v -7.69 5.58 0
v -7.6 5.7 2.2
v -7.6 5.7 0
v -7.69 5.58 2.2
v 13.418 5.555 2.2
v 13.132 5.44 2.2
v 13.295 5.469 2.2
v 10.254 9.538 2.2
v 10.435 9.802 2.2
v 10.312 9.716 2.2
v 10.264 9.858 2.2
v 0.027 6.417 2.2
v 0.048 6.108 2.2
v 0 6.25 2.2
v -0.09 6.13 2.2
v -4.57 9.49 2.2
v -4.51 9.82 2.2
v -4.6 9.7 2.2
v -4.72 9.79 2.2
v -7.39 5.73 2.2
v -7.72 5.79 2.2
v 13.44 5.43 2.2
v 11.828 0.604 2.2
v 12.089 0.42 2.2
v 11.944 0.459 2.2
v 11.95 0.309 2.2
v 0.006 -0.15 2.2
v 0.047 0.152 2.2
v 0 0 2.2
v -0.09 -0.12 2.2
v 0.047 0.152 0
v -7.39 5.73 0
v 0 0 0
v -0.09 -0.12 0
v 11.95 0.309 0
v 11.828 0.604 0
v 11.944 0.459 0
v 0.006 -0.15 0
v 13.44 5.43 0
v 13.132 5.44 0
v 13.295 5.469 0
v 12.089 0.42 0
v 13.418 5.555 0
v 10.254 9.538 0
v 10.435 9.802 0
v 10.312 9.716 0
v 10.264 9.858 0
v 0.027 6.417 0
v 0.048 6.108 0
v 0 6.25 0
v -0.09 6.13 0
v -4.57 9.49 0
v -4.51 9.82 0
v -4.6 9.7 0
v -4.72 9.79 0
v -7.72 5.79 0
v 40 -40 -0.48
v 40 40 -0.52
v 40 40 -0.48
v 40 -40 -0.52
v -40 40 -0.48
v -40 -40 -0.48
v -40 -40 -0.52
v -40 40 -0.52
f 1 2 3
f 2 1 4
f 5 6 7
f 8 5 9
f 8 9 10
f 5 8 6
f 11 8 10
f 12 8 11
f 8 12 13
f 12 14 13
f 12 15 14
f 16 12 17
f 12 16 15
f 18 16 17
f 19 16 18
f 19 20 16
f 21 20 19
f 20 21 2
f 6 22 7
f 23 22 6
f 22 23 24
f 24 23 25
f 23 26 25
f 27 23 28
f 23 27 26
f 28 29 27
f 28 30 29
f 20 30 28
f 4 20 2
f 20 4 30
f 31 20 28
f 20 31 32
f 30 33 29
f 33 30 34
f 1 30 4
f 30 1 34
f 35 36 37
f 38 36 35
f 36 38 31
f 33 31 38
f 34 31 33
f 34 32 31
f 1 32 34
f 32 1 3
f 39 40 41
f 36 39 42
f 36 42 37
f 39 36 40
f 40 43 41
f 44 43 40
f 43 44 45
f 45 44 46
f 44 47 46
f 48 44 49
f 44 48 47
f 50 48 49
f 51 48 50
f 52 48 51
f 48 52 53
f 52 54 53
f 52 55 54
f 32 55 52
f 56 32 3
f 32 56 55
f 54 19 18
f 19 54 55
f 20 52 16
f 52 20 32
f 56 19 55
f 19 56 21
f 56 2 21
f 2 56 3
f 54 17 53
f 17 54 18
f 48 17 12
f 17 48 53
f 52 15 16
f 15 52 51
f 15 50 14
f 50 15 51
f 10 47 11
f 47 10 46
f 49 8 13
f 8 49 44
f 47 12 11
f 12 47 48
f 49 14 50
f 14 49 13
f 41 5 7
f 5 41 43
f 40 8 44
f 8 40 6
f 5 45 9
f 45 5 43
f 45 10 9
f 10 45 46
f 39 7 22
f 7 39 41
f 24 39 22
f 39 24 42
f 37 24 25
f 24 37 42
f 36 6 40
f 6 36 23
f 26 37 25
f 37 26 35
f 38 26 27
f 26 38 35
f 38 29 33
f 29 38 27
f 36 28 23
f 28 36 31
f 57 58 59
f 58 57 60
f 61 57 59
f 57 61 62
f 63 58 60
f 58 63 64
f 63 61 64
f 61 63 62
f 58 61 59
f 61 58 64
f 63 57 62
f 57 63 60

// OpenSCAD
// file: lib/measurement.scad
// Written in 2015 by Marius Kintel <marius@kintel.net>
// Additions 2020 by Mokshasoft AB
//
// To the extent possible under law, the author(s) have dedicated all
// copyright and related and neighboring rights to this software to the
// public domain worldwide. This software is distributed without any
// warranty.
//
// You should have received a copy of the CC0 Public Domain
// Dedication along with this software.
// If not, see <http://creativecommons.org/publicdomain/zero/1.0/>.

// Area of a triangle with the 3rd vertex in the origin
function triarea(v0, v1) = cross(v0, v1) / 2;

// Area of a polygon using the Shoelace formula
function area(vertices) =
  let (areas = [let (num=len(vertices))
                  for (i=[0:num-1]) 
                    triarea(vertices[i], vertices[(i+1)%num])
               ])
      sum(areas);

// Recursive helper function: Sums all values in a list.
// In this case, sum all partial areas into the final area.
function sum(values,s=0) =
  s == len(values) - 1 ? values[s] : values[s] + sum(values,s+1);

function length(p1, p2) =
    sqrt(pow(p1[0] - p2[0], 2) + pow(p1[1] - p2[1], 2));

function vlength(p) =
  let (num  = len(p),
       lens = [ for (i=[0:num-2]) length(p[i], p[i + 1]) ])
    sum(lens);

function angle(p1, pc, p2) =
  let ( v1 = p1 - pc
      , v2 = p2 - pc
      , n1 = v1/norm(v1)
      , n2 = v2/norm(v2)
      )
    acos(n1*n2);
// file: lib/element.scad
// constants
gr = 1.61803; // golden ration

// calculate the coordinates for the corners
function point(i, r, corners) =
   let (vz = 360/corners/2)
   let (angle=i*(360/corners) - vz)
   [ r*cos(angle)
   , r*sin(angle)
   ];

function inbetween(p1, p2, procent) =
    let (x_diff = p2[0] - p1[0])
    let (y_diff = p2[1] - p1[1])
    [ p1[0] + x_diff*procent/100
    , p1[1] + y_diff*procent/100
    ];

module glas_color() {
    color("lightblue")
    children();
}

// create a wall
module wall(p1, p2, h, thickness = 300) {
    let (x_diff = p2[0] - p1[0])
    let (y_diff = p2[1] - p1[1])
    let (len = sqrt(pow(x_diff, 2) +
                    pow(y_diff, 2)))
    linear_extrude(height = h)
    translate(p1)
    rotate(atan2(y_diff, x_diff))
    translate([0, -thickness/2])
    square([len, thickness]);
}

module octagon(r, h, corners) {
    coords=[for (i = [0:corners-1]) point(i, r, corners)];
    linear_extrude(height = h)
    polygon(coords);
}

module octawalls(r, h, wt, corners) {
    difference () {
        octagon(r, h, corners);
        translate([0, 0, -wt])
        octagon(r - wt, h + 2*wt, corners);
    }
}

module window(p1, p2, pos, height, sizex, sizey, wt = 300) {
    assert(0 < pos && pos < 100);
    x_diff = p2[0] - p1[0];
    y_diff = p2[1] - p1[1];
    len = sqrt(pow(x_diff, 2) +
               pow(y_diff, 2));
    difference () {
        children();
        // create the hole for the window
        translate([0,0,height])
        translate(p1 + pos*[x_diff, y_diff]/100)
        rotate(atan2(y_diff, x_diff) + 90, [0,0,1])
        cube([4*wt, sizex, sizey], center = true);
    }
    // add the glass to the window
    glas_color()
    translate([0,0,height])
    translate(p1 + pos*[x_diff, y_diff]/100)
    rotate(atan2(y_diff, x_diff) + 90, [0,0,1])
    translate([wt/2, 0, 0])
    cube([wt/2, sizex, sizey], center = true);
}

module color_lawn() {
    color("LawnGreen")
    children();
}

module color_outer_wall() {
    color("MediumSpringGreen")
    children();
}

module color_inner_wall() {
    color("Ivory")
    children();
}

module color_roof() {
    color("Lavender")
    children();
}

module color_floor() {
    color("Wheat")
    children();
}

module color_logs() {
    color("Ivory")
    children();
}

module color_glass() {
    color("azure", 0.25)
    children();
}
// main file
include <lib/element.scad>
include <lib/measurement.scad>

// configure the rendering
show_floor = true;
show_roof = true;
show_lawn = true;

// Parameters
s = 20;
a1 = atan(3/4);
ll = 9.5;
wl = 5;
a2 = 10;
l2 = 11.3;
l3 = 13.5;
l4 = 4.7;

room_h = 2.2;  // room height
oh = 0.6;       // over-hang of the roof
log_d = 0.4;    // log diameter

module win(p1, p2, pos, height, sizex, sizey, wt = 0.3) {
    window(p1, p2, pos, height, sizex, sizey, wt)
    children();
}

module w(p1, p2, h, thickness = 0.300) {
    wall(p1, p2, h, thickness)
    children();
}

// Corners of the outer walls of house
p1 = [0, 0];
p2 = p1 + [-ll*cos(a1), ll*sin(a1)];
p3 = p2 + [-wl*cos(a1 + 90), wl*sin(a1 + 90)];
p4 = [0, wl/cos(a1)];
pc = (p1 + p4)/2;
p6 = pc + [l3*cos(a2), l3*sin(a2)];
p5 = pc + [l2*cos(a2), l2*sin(a2)] + [-l4*cos(a2 - 90), -l4*sin(a2 - 90)];
p7 = pc + [l2*cos(a2), l2*sin(a2)] + [l4*cos(a2 - 90), l4*sin(a2 - 90)];

// Corners of the bed-room

// Lawn
if (show_lawn) {
    color_lawn()
    translate([0, 0, -0.5])
    cube([4*s, 4*s, 0.04], center = true);
}

module hus() {
    // Windows

    color_outer_wall()
    union() {
        // Outer walls
        w(p1, p2, room_h);
        w(p2, p3, room_h);
        w(p3, p4, room_h);
        w(p4, p5, room_h);
        w(p5, p6, room_h);
        w(p6, p7, room_h);
        w(p7, p1, room_h);
    }

    if (show_floor) {
        //color_floor()
        //linear_extrude(300)
        //polygon([p1, p2, p3, p4, p5]);
    }

    if (show_roof) {
    }

}

hus();

// Areas
house_area = -area([p1, p2, p3, p4, p5, p6, p7, p1]);
echo("house area = ", house_area, " m2");

// Lengths
l57 = length(p5, p7);
echo("longest roof length = ", l57);

// Material calculations
th_walls = 0.4;
th_floor = 0.3;
th_roof = 0.5;

wall_length = vlength([p1, p2, p3, p4, p5, p6, p7, p1]);
wall_area = wall_length * room_h;
wall_volume = wall_area * th_walls;
echo("wall length = ", wall_length, " m");
echo("wall area = ", wall_area, " m2");
echo("wall volume = ", wall_volume, " m3");

roof_volume = house_area*th_roof;
floor_volume = house_area*th_floor;
echo("roof volume = ", roof_volume);
echo("floor volume = ", floor_volume);

total_volume = wall_volume + roof_volume + floor_volume;
echo("total volume = ", total_volume);

// Angles
echo("south angle = ", angle(p3, p4, p5));
